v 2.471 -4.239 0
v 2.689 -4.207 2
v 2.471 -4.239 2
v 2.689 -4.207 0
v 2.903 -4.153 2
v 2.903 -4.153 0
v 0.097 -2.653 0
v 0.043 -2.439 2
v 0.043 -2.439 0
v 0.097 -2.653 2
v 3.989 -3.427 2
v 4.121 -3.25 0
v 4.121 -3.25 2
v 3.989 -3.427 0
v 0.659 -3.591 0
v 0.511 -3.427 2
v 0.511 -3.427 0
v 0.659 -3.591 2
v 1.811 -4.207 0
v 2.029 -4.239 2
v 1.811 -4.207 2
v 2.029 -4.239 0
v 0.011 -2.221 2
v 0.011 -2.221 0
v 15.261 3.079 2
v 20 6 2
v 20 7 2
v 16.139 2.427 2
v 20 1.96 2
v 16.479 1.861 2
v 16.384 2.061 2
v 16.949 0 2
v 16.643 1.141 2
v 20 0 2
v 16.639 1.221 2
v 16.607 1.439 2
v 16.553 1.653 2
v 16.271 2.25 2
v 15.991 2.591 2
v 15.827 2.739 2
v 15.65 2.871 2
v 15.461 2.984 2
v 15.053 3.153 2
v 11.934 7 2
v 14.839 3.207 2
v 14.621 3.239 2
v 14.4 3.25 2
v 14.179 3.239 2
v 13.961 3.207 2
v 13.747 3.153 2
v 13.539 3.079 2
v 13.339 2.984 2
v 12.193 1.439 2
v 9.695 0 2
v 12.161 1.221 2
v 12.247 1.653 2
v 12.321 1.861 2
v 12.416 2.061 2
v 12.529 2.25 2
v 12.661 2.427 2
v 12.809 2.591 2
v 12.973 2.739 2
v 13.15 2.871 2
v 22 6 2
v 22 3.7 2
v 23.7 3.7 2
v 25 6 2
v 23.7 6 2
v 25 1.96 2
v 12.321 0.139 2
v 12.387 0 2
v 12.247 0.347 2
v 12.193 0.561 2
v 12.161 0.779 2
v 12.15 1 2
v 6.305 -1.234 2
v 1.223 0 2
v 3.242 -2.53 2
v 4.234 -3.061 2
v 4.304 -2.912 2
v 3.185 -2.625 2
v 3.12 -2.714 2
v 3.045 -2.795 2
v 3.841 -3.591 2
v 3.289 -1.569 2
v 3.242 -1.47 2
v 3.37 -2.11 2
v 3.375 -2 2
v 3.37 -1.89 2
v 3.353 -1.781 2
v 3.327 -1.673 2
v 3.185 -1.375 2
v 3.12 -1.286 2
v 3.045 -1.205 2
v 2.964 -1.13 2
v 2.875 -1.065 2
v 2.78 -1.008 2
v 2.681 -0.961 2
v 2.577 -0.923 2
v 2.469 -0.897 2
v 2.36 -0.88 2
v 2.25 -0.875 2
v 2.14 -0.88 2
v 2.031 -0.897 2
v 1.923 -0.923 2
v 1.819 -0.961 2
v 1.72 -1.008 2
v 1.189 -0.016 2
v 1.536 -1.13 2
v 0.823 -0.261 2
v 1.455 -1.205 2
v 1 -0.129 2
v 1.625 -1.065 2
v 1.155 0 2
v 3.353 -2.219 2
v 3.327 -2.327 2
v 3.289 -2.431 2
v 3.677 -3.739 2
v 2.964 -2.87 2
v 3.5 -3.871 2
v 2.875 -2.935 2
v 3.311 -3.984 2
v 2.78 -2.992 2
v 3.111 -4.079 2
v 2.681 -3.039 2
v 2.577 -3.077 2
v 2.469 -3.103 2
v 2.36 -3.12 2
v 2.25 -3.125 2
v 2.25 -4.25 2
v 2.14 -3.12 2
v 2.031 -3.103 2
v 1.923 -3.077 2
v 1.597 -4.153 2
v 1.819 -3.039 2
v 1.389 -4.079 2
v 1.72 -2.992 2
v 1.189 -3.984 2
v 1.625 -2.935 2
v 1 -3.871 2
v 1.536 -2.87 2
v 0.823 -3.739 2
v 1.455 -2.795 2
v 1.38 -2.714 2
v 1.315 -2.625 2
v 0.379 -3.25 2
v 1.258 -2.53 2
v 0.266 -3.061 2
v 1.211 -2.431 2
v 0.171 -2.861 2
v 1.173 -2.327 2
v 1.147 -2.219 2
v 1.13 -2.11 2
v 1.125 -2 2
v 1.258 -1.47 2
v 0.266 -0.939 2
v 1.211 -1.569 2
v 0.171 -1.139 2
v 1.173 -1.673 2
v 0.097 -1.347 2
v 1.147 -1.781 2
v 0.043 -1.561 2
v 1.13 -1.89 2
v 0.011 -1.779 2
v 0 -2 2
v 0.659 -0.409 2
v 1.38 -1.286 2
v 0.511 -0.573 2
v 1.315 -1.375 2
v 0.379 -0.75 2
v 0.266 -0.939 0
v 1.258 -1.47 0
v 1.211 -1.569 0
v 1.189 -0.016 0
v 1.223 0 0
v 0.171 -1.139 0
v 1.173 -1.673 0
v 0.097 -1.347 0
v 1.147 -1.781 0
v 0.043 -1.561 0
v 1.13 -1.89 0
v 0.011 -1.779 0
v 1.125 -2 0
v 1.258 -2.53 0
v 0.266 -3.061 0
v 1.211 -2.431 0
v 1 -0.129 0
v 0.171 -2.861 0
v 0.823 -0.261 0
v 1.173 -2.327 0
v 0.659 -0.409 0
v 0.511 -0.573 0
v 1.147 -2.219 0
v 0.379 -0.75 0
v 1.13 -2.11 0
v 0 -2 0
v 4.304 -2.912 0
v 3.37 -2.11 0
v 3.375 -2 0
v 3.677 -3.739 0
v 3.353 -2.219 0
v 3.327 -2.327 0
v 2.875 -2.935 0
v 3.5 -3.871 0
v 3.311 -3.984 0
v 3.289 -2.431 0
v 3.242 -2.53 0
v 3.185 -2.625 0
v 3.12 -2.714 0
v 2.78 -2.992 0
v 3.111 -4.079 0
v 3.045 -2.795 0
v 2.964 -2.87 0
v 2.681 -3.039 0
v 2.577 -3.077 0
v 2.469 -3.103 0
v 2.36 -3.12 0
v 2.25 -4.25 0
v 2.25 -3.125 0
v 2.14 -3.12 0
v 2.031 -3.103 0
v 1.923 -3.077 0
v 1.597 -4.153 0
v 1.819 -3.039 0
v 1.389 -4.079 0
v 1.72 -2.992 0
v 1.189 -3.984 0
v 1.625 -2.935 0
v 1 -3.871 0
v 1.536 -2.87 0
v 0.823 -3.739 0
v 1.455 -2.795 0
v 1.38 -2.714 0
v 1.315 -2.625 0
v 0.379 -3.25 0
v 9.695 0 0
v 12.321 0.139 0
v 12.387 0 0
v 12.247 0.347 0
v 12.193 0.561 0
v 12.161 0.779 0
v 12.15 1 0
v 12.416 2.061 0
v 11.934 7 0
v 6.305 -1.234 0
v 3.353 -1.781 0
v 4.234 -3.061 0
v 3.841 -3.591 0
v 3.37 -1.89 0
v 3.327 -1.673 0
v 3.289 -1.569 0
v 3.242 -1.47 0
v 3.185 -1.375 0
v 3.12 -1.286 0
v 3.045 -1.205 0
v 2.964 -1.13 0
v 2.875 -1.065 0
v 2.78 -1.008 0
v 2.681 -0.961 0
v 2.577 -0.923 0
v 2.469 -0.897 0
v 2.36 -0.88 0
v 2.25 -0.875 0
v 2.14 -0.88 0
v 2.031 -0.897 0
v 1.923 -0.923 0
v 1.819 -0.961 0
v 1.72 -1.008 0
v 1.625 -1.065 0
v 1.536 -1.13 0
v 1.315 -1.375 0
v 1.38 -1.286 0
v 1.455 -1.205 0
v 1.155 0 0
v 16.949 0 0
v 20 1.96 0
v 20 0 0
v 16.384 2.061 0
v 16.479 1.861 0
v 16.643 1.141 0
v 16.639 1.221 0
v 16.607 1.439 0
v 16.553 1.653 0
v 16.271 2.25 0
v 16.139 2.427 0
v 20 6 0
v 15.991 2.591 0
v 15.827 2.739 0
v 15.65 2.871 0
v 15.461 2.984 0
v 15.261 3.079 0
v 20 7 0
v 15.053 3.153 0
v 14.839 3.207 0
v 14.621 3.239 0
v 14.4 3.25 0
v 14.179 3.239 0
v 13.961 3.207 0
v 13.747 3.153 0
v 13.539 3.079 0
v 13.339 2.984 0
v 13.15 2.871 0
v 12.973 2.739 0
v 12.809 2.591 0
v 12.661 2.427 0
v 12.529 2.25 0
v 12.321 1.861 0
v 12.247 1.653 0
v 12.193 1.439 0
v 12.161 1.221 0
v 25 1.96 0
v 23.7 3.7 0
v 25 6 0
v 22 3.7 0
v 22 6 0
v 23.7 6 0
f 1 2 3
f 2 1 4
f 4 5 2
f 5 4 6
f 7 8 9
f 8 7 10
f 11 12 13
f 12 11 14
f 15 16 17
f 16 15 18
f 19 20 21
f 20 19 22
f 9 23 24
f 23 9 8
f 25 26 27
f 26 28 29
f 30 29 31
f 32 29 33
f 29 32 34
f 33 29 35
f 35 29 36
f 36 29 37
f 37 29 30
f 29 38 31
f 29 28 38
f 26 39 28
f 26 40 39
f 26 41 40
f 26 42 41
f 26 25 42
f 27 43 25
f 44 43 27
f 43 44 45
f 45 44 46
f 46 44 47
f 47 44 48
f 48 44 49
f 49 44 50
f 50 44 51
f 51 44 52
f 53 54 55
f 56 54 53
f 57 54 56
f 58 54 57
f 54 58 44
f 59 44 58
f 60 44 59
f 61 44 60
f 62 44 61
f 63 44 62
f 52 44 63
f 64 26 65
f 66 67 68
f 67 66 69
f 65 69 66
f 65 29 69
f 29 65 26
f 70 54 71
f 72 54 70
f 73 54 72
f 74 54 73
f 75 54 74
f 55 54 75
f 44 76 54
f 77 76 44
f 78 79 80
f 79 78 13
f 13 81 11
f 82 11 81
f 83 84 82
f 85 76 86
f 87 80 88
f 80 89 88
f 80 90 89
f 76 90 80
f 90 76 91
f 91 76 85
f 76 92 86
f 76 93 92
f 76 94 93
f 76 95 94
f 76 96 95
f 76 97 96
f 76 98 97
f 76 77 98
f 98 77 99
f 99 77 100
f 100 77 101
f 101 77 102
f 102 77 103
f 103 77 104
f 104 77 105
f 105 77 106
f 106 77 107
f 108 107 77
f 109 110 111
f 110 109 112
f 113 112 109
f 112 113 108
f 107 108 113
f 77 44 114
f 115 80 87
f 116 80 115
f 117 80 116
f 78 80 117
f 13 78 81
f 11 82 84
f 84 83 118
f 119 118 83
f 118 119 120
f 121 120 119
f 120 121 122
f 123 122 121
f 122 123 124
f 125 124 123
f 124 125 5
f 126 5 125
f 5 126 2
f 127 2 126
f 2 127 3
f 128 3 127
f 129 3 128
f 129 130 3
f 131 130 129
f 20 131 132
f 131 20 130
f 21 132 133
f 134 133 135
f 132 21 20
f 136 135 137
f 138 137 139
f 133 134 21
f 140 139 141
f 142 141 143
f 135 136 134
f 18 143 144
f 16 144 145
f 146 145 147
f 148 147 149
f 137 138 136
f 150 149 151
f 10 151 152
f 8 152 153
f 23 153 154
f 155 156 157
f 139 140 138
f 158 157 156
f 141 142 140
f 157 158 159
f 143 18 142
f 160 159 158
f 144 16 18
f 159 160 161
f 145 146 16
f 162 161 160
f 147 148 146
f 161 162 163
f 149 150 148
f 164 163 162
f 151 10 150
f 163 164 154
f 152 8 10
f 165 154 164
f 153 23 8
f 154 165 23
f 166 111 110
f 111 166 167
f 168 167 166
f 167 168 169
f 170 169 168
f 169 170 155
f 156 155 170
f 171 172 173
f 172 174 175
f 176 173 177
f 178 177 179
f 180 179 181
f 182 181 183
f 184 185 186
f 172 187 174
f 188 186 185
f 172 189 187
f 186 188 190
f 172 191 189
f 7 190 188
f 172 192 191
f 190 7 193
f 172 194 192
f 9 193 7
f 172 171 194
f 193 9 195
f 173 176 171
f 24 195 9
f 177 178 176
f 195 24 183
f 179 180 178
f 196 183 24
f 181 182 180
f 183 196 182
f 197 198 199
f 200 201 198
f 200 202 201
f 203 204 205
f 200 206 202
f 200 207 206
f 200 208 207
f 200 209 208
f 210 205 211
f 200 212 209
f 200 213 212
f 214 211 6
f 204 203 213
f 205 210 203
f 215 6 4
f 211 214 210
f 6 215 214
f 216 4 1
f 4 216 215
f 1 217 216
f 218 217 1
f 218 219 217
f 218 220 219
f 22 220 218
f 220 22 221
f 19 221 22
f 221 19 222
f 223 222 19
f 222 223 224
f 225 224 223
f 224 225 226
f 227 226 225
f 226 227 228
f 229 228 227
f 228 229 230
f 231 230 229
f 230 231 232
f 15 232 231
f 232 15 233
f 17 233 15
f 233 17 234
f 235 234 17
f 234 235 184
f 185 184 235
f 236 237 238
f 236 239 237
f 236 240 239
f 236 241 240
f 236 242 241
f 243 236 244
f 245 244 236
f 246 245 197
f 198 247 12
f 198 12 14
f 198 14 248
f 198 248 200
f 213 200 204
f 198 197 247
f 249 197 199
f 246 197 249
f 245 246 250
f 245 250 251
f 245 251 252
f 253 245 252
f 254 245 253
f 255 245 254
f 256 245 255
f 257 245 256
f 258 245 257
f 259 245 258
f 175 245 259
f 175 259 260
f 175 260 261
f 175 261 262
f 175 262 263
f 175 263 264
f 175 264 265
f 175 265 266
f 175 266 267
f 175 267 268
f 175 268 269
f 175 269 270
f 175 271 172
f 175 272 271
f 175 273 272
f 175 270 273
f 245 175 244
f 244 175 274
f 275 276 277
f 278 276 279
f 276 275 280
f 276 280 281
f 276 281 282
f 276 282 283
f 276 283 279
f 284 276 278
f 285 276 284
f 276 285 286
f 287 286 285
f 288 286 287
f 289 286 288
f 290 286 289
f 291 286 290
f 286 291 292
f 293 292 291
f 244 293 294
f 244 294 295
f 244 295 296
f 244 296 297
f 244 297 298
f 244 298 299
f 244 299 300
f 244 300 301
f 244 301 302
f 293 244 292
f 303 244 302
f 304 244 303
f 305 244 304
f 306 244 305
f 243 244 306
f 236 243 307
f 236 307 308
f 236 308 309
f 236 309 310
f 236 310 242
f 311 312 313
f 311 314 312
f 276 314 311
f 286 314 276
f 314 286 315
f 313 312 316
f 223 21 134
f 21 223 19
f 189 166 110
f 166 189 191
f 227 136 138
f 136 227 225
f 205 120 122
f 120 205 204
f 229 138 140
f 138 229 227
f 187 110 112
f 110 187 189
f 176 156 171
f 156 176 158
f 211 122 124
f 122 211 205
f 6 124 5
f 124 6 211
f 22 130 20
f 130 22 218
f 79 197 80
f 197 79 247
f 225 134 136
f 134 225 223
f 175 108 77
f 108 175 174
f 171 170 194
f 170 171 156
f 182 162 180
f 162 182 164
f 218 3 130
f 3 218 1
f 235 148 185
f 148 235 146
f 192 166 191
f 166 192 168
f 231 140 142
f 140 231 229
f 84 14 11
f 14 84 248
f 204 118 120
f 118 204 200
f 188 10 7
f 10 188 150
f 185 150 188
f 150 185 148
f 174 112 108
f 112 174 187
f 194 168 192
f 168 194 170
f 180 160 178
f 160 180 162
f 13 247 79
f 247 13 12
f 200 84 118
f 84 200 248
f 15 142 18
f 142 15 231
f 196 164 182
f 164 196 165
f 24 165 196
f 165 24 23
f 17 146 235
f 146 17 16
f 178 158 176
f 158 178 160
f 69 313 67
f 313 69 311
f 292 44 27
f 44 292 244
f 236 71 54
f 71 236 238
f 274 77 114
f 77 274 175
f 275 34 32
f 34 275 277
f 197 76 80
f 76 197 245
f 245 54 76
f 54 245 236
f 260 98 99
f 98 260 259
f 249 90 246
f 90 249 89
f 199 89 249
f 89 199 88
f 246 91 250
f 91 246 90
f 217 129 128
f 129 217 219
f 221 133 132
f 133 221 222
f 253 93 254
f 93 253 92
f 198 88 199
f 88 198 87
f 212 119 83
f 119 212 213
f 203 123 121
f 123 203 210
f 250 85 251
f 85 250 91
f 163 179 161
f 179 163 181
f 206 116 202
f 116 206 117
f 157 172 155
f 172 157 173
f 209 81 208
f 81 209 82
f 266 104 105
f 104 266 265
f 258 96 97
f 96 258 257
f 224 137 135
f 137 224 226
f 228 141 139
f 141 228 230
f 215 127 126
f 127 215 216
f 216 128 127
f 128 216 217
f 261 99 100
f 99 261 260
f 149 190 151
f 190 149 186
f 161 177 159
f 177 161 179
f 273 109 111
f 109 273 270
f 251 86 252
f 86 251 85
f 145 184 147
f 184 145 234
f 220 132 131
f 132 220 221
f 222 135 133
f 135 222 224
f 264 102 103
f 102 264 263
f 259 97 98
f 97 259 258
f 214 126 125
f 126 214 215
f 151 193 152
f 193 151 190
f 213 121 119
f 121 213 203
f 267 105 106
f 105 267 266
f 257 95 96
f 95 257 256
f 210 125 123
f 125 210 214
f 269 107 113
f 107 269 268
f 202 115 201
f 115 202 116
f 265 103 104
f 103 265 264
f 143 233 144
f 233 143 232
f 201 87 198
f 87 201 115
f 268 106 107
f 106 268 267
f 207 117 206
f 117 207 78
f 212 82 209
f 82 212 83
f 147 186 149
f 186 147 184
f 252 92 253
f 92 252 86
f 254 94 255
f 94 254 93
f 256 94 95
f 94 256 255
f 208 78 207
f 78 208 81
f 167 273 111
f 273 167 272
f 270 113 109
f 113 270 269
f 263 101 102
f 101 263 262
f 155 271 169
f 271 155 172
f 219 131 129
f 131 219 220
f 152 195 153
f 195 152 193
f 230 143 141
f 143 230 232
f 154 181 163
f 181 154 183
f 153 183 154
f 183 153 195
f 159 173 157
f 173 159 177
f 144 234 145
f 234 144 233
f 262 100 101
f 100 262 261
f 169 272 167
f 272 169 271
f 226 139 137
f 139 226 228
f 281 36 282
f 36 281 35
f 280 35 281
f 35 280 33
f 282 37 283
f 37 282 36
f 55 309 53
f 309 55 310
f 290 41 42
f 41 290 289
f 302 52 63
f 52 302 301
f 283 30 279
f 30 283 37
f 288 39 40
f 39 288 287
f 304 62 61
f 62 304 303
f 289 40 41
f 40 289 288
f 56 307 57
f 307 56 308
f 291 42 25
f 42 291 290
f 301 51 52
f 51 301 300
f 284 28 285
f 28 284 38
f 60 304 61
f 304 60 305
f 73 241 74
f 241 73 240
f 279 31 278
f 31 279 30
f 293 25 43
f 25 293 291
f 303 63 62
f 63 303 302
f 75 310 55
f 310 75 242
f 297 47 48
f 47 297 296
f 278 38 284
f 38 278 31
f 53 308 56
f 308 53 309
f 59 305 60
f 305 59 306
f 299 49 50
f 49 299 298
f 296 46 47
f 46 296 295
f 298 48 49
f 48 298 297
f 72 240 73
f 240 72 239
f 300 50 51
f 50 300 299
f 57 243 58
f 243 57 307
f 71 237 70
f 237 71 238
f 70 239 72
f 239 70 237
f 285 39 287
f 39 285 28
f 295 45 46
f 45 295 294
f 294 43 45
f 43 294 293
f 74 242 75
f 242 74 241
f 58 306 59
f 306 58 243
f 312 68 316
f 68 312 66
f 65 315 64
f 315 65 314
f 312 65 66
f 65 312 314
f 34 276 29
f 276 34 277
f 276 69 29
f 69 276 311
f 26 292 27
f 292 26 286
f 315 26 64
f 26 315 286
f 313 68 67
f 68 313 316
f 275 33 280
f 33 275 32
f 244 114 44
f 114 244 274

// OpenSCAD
$fn = 64;
height = 2;

difference(){
    union(){
        translate([2.25,-2,0]){
            cylinder(height,2.25,2.25);
        }
        cube([25,7,height]);
     
        translate([4.2,-3,0]){
            rotate([0,0,40]){
                cube([7,3,height]);
            }
        }
        translate([4.2,-2,0]){
            rotate([0,0,20]){
                cube([7,3,height]);
            }
        }
        
    }
    union(){
        translate([2.25,-2,0]){
            cylinder(height,2.25/2,2.25/2);
        }
        translate([14.4,1,0]){
            cylinder(height,4.5/2,4.5/2);
        }
        translate([22,3.7,0]){
            cube([1.7,20,height]);
        }
        translate([20,-10,0]){
            cube([20,11.96,height]);
        }
        translate([20,6,0]){
            cube([20,2,height]);
        }
        translate([15.95,-4,0]){
            rotate([0,0,15]){
                cube([2,5,height]);
            }
        }
        translate([0,-0.75,0]){
            rotate([0,0,33]){
                cube([20,20,height]);
            }
        }
    }
}
